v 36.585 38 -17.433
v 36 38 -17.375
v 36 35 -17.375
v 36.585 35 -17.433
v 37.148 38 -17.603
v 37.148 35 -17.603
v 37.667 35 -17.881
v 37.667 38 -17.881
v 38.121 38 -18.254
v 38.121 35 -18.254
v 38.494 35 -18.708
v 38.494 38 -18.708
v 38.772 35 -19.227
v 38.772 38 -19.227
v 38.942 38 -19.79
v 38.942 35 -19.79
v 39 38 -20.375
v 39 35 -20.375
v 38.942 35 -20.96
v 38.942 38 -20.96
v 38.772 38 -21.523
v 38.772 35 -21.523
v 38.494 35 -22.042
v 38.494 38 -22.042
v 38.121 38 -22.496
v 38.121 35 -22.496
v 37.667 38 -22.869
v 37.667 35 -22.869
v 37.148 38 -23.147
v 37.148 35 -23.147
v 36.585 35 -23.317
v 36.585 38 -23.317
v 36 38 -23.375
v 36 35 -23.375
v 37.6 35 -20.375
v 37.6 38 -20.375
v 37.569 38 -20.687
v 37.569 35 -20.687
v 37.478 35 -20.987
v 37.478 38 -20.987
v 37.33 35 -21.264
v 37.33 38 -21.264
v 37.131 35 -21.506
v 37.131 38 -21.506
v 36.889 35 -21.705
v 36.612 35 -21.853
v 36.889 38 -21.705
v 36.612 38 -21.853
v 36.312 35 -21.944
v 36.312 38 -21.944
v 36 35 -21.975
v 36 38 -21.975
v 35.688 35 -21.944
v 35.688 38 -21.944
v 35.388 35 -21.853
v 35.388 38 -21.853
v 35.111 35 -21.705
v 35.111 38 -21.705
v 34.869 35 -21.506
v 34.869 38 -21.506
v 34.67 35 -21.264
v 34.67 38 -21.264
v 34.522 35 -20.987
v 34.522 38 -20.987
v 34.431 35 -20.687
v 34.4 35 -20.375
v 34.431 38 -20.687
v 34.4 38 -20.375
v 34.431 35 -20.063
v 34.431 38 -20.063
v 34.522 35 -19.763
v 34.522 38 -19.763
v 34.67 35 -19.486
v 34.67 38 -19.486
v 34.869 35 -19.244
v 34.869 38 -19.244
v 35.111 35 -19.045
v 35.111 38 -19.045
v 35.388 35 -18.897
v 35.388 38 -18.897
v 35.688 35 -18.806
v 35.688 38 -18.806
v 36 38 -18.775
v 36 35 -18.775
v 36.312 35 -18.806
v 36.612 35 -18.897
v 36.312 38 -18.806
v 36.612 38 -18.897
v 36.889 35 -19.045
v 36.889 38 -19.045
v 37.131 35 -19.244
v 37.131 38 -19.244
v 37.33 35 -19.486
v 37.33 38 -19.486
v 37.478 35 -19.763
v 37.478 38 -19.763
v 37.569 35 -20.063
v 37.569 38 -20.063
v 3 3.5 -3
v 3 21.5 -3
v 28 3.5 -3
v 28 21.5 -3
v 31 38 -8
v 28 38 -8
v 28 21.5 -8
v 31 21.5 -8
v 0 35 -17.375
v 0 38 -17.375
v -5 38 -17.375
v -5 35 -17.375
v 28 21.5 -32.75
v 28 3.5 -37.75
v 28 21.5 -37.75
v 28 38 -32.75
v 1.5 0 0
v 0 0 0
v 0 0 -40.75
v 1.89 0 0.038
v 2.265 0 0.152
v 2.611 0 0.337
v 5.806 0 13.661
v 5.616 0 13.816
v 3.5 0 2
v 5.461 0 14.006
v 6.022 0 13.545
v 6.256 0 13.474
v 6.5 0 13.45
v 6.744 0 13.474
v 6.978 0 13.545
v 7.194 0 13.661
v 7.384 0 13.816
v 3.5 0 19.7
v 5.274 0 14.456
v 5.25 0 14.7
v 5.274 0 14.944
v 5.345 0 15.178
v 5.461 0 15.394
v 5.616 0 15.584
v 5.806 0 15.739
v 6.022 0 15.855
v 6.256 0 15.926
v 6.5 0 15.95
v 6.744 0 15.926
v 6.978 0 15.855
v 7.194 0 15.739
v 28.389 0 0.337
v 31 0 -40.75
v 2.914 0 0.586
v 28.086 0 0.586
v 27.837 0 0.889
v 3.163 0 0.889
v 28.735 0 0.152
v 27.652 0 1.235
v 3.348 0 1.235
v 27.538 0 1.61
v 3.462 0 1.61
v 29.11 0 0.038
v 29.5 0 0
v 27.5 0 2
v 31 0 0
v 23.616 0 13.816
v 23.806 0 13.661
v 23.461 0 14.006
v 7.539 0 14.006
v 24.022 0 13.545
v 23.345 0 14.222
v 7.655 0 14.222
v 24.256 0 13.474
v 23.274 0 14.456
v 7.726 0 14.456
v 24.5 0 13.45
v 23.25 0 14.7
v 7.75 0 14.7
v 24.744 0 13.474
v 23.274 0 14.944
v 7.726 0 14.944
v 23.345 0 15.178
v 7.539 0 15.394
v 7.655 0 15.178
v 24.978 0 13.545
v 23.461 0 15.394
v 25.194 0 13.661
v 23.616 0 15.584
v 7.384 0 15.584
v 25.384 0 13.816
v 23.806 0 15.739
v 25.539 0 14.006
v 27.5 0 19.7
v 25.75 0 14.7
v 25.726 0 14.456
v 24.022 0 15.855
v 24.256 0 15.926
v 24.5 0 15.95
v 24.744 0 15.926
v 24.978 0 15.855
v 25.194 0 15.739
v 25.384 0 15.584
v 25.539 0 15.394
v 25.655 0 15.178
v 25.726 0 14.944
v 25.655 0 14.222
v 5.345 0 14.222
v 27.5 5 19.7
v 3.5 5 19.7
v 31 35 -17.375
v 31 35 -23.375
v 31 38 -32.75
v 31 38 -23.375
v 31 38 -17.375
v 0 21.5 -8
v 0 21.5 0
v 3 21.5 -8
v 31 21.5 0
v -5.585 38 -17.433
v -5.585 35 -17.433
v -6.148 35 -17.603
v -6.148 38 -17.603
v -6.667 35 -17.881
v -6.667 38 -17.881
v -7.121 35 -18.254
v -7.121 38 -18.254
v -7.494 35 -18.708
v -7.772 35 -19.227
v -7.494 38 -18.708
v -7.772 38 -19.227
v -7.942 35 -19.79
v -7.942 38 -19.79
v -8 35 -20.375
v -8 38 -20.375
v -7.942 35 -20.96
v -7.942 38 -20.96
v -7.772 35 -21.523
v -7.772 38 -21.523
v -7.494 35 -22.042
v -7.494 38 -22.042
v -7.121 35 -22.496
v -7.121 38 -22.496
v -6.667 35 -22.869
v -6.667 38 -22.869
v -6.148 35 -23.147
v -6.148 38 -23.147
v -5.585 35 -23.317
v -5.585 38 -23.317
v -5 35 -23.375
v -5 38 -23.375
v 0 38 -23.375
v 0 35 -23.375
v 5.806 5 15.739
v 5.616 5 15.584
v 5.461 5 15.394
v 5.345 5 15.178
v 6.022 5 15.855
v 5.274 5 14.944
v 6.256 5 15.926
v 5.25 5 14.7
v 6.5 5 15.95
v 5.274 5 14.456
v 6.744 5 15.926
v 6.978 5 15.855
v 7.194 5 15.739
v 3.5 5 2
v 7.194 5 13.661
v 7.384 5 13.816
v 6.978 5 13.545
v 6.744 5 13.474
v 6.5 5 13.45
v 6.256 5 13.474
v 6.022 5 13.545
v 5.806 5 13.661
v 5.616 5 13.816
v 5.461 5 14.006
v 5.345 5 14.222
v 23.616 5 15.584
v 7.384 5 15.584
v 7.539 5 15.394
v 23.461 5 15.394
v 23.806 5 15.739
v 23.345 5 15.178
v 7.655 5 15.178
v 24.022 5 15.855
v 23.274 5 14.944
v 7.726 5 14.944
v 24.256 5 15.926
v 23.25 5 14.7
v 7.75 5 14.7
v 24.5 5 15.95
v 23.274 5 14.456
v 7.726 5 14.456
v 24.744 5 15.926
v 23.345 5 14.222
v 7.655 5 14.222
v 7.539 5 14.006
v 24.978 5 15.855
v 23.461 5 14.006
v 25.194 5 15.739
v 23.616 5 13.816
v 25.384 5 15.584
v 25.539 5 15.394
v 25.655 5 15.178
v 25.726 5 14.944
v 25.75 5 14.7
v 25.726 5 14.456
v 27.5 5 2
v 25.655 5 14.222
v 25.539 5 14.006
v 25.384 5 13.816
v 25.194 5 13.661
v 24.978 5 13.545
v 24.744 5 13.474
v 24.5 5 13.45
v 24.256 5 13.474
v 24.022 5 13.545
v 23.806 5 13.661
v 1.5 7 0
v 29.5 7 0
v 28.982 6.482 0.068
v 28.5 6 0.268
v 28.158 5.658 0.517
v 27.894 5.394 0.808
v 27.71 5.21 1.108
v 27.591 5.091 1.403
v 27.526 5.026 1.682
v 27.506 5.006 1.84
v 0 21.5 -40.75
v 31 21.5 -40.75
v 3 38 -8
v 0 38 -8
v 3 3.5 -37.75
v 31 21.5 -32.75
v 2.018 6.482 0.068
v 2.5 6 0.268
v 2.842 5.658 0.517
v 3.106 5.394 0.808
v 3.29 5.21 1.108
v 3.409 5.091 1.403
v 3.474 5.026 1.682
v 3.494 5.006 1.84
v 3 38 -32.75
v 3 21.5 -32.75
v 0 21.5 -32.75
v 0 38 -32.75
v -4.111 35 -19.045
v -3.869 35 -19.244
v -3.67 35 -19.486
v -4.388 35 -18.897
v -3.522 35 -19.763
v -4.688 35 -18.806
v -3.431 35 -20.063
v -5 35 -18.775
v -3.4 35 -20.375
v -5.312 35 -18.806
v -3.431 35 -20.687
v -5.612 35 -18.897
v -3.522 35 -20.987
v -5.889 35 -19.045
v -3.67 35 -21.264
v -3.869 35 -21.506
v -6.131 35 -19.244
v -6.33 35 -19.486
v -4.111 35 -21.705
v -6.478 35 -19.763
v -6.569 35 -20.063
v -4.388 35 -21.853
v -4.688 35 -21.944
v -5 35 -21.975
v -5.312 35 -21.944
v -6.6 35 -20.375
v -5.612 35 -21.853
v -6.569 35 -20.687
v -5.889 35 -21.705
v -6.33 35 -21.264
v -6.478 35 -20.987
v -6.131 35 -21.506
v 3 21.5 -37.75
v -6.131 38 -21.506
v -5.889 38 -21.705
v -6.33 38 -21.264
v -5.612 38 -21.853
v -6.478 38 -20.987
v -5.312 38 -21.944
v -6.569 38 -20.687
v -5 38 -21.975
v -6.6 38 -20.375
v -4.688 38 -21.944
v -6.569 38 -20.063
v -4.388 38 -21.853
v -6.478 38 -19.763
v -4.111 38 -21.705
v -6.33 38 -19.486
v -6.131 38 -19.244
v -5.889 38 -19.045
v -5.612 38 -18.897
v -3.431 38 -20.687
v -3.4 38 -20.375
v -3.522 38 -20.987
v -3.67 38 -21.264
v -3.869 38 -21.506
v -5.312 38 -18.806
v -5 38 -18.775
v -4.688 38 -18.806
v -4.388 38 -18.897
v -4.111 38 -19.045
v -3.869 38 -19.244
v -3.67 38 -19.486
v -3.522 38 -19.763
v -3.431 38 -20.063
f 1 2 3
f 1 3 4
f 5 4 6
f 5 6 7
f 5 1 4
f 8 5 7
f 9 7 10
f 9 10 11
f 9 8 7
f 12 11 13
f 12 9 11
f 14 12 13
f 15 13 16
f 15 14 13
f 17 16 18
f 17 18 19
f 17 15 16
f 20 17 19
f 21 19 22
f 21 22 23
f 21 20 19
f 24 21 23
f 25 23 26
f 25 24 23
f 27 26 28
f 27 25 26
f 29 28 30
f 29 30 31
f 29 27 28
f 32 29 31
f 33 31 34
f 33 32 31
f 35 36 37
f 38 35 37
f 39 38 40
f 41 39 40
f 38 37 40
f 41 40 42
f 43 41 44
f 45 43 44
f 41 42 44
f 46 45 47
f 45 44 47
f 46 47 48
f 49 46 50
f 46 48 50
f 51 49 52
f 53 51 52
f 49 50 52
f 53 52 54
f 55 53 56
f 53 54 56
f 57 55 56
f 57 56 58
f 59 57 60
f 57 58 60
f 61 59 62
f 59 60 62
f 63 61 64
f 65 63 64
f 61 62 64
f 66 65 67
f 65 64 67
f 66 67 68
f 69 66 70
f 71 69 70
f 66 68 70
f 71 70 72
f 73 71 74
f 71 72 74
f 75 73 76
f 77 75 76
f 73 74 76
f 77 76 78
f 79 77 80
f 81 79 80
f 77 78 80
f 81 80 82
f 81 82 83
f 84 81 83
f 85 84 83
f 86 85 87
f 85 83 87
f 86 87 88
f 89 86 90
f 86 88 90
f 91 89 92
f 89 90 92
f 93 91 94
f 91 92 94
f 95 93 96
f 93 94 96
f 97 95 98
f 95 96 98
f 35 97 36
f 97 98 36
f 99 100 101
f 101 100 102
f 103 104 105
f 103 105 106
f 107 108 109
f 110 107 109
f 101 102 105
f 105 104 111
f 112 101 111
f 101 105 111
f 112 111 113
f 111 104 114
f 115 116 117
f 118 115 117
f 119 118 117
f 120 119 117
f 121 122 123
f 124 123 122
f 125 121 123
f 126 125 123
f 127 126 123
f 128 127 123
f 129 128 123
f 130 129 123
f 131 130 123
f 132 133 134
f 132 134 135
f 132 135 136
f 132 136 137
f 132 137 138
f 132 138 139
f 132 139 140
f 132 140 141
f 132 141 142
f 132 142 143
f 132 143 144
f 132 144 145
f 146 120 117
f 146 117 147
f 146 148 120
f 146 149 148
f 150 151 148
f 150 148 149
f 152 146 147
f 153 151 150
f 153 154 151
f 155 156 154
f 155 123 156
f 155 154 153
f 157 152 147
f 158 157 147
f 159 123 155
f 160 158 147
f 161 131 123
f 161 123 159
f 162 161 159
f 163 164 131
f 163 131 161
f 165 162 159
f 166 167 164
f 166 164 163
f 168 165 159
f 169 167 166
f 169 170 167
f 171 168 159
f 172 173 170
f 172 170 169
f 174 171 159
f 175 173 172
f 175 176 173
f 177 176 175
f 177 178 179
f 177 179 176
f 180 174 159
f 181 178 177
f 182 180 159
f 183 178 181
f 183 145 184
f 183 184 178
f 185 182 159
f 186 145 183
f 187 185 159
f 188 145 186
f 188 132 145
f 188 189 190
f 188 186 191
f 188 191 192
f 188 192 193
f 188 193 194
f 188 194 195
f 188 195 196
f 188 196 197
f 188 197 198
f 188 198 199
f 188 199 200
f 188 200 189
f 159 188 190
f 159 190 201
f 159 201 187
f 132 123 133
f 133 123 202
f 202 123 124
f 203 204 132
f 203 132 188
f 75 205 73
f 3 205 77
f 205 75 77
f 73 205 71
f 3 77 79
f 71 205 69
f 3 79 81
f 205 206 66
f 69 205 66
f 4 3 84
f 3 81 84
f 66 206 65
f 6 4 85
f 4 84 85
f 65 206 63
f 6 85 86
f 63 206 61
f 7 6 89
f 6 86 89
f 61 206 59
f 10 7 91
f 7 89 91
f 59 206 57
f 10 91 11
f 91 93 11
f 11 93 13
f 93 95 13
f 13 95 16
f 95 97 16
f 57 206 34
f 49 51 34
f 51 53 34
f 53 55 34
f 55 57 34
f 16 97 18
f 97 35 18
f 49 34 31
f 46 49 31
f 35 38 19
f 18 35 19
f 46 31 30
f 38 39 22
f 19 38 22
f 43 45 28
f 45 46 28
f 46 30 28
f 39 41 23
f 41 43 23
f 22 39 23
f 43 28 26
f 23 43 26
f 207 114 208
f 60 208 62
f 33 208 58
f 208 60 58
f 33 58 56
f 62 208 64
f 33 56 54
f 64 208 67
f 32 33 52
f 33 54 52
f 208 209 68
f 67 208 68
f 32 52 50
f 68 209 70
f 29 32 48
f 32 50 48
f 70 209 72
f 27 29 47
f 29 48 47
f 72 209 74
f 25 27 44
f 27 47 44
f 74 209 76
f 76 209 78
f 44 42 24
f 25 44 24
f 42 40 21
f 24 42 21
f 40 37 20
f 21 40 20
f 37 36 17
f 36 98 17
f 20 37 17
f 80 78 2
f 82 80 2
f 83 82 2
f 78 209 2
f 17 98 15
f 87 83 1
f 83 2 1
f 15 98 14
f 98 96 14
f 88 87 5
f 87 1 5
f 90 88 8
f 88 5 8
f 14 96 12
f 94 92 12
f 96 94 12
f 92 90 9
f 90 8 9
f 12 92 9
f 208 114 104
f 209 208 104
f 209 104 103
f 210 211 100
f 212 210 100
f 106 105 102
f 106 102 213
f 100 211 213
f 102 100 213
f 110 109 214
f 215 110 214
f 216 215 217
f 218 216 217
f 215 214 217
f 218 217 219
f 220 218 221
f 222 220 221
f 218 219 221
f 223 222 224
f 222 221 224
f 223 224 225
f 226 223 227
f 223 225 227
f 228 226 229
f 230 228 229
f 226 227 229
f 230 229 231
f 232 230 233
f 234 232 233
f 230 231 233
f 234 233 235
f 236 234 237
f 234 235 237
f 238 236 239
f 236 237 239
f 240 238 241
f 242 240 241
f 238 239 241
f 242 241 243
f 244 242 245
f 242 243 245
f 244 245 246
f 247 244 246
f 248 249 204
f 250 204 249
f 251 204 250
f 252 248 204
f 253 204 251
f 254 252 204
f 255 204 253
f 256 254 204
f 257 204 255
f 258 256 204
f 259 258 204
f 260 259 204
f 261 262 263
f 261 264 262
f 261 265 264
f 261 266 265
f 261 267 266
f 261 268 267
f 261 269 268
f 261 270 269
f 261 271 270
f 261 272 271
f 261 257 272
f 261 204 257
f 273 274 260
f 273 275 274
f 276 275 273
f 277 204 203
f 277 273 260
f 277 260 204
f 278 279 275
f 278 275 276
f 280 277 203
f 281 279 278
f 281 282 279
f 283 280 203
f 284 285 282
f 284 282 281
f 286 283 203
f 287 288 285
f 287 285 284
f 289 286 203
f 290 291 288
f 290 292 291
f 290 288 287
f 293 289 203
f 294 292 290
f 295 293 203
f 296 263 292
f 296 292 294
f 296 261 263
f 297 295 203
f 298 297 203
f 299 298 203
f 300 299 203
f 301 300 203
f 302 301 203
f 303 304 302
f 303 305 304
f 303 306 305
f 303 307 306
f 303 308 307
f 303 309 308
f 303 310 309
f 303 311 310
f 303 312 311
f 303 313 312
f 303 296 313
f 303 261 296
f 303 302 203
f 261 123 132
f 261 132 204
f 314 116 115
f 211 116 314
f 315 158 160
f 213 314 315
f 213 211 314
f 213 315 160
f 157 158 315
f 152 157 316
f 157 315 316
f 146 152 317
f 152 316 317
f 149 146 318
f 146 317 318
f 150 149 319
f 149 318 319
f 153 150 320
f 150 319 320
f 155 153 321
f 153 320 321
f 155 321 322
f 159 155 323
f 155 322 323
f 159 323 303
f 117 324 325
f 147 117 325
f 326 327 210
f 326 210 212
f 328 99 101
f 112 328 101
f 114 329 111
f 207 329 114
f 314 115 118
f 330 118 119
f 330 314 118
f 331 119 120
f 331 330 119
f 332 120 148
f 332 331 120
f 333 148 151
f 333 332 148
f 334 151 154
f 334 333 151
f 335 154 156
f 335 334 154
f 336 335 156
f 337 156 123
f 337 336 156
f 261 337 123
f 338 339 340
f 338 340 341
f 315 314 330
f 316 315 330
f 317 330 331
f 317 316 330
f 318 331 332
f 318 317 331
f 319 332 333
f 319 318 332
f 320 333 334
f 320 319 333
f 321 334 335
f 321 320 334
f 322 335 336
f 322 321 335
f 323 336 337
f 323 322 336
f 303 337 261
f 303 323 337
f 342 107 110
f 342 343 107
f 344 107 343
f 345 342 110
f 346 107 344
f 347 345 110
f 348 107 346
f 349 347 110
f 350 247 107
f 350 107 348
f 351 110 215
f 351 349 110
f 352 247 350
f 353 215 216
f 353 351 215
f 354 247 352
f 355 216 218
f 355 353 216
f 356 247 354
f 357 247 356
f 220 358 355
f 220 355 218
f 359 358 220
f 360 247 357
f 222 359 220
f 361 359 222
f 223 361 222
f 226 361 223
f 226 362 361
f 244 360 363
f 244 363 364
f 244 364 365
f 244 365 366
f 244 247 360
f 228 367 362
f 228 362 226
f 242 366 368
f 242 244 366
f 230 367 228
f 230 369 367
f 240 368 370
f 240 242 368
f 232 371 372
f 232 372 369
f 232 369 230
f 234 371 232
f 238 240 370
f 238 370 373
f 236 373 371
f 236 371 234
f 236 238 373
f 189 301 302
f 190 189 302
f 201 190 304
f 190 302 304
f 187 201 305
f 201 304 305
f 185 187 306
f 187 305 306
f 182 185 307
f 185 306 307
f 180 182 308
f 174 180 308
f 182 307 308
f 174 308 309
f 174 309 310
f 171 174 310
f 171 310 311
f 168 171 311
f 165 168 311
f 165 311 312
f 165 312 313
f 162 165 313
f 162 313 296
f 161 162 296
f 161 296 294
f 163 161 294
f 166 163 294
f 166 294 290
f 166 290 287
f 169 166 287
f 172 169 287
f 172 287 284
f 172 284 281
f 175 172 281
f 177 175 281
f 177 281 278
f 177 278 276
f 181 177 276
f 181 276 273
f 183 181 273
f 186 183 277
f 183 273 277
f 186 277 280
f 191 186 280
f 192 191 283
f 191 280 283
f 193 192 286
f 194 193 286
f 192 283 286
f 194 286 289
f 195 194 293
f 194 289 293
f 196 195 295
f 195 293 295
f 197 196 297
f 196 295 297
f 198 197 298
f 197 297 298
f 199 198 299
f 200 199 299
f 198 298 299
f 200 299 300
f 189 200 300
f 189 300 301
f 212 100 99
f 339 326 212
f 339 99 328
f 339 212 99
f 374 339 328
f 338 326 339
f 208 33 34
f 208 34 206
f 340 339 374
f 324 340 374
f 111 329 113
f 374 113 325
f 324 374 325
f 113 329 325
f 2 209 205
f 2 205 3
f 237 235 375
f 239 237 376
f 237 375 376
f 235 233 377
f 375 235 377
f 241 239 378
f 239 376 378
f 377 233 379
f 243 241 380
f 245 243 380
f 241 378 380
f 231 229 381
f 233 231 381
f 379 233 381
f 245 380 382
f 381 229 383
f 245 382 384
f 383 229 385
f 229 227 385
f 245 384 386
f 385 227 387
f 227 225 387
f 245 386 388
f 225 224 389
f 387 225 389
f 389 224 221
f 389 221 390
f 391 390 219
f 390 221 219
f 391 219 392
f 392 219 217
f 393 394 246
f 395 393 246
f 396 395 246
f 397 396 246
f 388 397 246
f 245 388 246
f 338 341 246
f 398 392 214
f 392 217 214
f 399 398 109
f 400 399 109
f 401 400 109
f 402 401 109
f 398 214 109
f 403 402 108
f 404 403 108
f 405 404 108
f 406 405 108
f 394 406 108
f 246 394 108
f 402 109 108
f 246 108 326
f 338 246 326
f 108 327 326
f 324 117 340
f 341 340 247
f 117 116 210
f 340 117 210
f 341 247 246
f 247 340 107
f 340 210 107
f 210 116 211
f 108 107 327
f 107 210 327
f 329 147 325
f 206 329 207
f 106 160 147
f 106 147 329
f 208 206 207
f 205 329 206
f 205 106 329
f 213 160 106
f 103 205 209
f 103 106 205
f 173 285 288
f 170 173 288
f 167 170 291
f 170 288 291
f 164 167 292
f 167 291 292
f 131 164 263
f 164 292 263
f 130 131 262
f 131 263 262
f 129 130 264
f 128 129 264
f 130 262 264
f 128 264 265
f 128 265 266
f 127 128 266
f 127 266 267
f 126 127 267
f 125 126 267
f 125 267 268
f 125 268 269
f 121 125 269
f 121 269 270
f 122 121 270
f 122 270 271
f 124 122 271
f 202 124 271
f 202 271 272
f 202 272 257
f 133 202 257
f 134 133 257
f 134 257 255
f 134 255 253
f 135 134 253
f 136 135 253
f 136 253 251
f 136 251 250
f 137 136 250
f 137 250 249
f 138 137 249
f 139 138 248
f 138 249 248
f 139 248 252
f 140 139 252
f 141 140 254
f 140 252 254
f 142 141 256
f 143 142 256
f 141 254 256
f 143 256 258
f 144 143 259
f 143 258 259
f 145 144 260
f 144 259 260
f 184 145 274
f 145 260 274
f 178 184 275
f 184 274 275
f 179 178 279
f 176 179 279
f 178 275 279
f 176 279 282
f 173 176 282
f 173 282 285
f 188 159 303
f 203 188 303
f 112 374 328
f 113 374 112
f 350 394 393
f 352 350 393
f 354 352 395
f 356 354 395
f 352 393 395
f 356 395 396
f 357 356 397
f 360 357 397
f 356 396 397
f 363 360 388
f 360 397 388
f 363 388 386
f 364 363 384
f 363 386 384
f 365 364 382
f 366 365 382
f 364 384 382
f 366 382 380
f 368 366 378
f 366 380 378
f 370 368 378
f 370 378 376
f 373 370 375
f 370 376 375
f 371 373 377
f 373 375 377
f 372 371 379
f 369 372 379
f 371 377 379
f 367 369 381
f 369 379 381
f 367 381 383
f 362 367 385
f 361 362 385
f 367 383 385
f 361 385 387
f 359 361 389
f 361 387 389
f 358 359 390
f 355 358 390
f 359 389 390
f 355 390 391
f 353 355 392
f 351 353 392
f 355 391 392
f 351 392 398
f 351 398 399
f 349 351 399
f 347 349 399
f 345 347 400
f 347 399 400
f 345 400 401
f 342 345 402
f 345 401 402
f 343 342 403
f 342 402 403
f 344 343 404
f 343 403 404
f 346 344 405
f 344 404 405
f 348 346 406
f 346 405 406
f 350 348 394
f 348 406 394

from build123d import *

# Parameters (mm, degrees)
SKETCH_1_W          = 31
SKETCH_1_H          = 38
EXTRUDE_1_DEPTH     = 40.75
SKETCH_2_W          = 8
SKETCH_2_H          = 16.5
CUT_EXTRUDE_1_DEPTH = 40.75
SKETCH_3_W          = 25
SKETCH_3_H          = 34.75
CUT_EXTRUDE_2_DEPTH = 34.5
SKETCH_4_R          = 12.5
CUT_EXTRUDE_3_DEPTH = 34.5
SKETCH_5_R          = 1.6
EXTRUDE_2_DEPTH     = 3
SKETCH_6_W          = 31
SKETCH_6_H          = 16.5
CUT_EXTRUDE_4_DEPTH = 8
SKETCH_7_W          = 24
SKETCH_7_H          = 5
EXTRUDE_3_DEPTH     = 19.7
SKETCH_8_R          = 1.25
CUT_EXTRUDE_5_DEPTH = 20.7
FILLET_1_R          = 2


with BuildPart() as part:
    # 草图1 → 凸台-拉伸1 (new body)
    with BuildSketch(Plane.XY):
        with Locations((15.5, 19)):
            Rectangle(SKETCH_1_W, SKETCH_1_H)
    extrude(amount=-EXTRUDE_1_DEPTH)

    # 草图2 → 切除-拉伸1 (cut)
    with BuildSketch(Plane(origin=(31, 0, 0), x_dir=(0, 0, -1), z_dir=(1, 0, 0))):
        with Locations((36.75, 29.75)):
            Rectangle(SKETCH_2_W, SKETCH_2_H)
    extrude(amount=-CUT_EXTRUDE_1_DEPTH, mode=Mode.SUBTRACT)

    # 草图3 → 切除-拉伸2 (cut)
    with BuildSketch(Plane(origin=(0, 38, 0), x_dir=(1, 0, 0), z_dir=(0, 1, 0))):
        with Locations((15.5, 20.375)):
            Rectangle(SKETCH_3_W, SKETCH_3_H)
    extrude(amount=-CUT_EXTRUDE_2_DEPTH, mode=Mode.SUBTRACT)

    # 草图4 → 切除-拉伸3 (cut)
    with BuildSketch(Plane.XY):
        with Locations((15.5, 38)):
            Circle(SKETCH_4_R)
    extrude(amount=-CUT_EXTRUDE_3_DEPTH, mode=Mode.SUBTRACT)

    # 草图5 → 凸台-拉伸2 (add)
    with BuildSketch(Plane(origin=(0, 38, 0), x_dir=(1, 0, 0), z_dir=(0, 1, 0))):
        with BuildLine():
            Line((36, 23.375), (31, 23.375))
            Line((31, 23.375), (31, 17.375))
            Line((31, 17.375), (36, 17.375))
            ThreePointArc((36, 17.375), (39, 20.375), (36, 23.375))
        make_face()
        with Locations((36, 20.375)):
            Circle(SKETCH_5_R, mode=Mode.SUBTRACT)
        with BuildLine():
            Line((0, 23.375), (0, 17.375))
            Line((0, 17.375), (-5, 17.375))
            ThreePointArc((-5, 17.375), (-8, 20.375), (-5, 23.375))
            Line((-5, 23.375), (0, 23.375))
        make_face()
        with Locations((-5, 20.375)):
            Circle(SKETCH_5_R, mode=Mode.SUBTRACT)
    extrude(amount=-EXTRUDE_2_DEPTH)

    # 草图6 → 切除-拉伸4 (cut)
    with BuildSketch(Plane.XY):
        with Locations((15.5, 29.75)):
            Rectangle(SKETCH_6_W, SKETCH_6_H)
    extrude(amount=-CUT_EXTRUDE_4_DEPTH, mode=Mode.SUBTRACT)

    # 草图7 → 凸台-拉伸3 (add)
    with BuildSketch(Plane.XY):
        with Locations((15.5, 2.5)):
            Rectangle(SKETCH_7_W, SKETCH_7_H)
    extrude(amount=EXTRUDE_3_DEPTH)

    # 草图8 → 切除-拉伸5 (cut)
    with BuildSketch(Plane(origin=(0, 5, 0), x_dir=(1, 0, 0), z_dir=(0, 1, 0))):
        with Locations((6.5, -14.7)):
            Circle(SKETCH_8_R)
        with Locations((24.5, -14.7)):
            Circle(SKETCH_8_R)
    extrude(amount=-CUT_EXTRUDE_5_DEPTH, mode=Mode.SUBTRACT)

    # 圆角1
    fillet_1_edges = [part.edges().sort_by_distance(p)[0] for p in [
        (3.5, 2.5, 0),
        (27.5, 2.5, 0),
        (15.5, 5, 0),
    ]]
    fillet(fillet_1_edges, radius=FILLET_1_R)


solid = part.part
